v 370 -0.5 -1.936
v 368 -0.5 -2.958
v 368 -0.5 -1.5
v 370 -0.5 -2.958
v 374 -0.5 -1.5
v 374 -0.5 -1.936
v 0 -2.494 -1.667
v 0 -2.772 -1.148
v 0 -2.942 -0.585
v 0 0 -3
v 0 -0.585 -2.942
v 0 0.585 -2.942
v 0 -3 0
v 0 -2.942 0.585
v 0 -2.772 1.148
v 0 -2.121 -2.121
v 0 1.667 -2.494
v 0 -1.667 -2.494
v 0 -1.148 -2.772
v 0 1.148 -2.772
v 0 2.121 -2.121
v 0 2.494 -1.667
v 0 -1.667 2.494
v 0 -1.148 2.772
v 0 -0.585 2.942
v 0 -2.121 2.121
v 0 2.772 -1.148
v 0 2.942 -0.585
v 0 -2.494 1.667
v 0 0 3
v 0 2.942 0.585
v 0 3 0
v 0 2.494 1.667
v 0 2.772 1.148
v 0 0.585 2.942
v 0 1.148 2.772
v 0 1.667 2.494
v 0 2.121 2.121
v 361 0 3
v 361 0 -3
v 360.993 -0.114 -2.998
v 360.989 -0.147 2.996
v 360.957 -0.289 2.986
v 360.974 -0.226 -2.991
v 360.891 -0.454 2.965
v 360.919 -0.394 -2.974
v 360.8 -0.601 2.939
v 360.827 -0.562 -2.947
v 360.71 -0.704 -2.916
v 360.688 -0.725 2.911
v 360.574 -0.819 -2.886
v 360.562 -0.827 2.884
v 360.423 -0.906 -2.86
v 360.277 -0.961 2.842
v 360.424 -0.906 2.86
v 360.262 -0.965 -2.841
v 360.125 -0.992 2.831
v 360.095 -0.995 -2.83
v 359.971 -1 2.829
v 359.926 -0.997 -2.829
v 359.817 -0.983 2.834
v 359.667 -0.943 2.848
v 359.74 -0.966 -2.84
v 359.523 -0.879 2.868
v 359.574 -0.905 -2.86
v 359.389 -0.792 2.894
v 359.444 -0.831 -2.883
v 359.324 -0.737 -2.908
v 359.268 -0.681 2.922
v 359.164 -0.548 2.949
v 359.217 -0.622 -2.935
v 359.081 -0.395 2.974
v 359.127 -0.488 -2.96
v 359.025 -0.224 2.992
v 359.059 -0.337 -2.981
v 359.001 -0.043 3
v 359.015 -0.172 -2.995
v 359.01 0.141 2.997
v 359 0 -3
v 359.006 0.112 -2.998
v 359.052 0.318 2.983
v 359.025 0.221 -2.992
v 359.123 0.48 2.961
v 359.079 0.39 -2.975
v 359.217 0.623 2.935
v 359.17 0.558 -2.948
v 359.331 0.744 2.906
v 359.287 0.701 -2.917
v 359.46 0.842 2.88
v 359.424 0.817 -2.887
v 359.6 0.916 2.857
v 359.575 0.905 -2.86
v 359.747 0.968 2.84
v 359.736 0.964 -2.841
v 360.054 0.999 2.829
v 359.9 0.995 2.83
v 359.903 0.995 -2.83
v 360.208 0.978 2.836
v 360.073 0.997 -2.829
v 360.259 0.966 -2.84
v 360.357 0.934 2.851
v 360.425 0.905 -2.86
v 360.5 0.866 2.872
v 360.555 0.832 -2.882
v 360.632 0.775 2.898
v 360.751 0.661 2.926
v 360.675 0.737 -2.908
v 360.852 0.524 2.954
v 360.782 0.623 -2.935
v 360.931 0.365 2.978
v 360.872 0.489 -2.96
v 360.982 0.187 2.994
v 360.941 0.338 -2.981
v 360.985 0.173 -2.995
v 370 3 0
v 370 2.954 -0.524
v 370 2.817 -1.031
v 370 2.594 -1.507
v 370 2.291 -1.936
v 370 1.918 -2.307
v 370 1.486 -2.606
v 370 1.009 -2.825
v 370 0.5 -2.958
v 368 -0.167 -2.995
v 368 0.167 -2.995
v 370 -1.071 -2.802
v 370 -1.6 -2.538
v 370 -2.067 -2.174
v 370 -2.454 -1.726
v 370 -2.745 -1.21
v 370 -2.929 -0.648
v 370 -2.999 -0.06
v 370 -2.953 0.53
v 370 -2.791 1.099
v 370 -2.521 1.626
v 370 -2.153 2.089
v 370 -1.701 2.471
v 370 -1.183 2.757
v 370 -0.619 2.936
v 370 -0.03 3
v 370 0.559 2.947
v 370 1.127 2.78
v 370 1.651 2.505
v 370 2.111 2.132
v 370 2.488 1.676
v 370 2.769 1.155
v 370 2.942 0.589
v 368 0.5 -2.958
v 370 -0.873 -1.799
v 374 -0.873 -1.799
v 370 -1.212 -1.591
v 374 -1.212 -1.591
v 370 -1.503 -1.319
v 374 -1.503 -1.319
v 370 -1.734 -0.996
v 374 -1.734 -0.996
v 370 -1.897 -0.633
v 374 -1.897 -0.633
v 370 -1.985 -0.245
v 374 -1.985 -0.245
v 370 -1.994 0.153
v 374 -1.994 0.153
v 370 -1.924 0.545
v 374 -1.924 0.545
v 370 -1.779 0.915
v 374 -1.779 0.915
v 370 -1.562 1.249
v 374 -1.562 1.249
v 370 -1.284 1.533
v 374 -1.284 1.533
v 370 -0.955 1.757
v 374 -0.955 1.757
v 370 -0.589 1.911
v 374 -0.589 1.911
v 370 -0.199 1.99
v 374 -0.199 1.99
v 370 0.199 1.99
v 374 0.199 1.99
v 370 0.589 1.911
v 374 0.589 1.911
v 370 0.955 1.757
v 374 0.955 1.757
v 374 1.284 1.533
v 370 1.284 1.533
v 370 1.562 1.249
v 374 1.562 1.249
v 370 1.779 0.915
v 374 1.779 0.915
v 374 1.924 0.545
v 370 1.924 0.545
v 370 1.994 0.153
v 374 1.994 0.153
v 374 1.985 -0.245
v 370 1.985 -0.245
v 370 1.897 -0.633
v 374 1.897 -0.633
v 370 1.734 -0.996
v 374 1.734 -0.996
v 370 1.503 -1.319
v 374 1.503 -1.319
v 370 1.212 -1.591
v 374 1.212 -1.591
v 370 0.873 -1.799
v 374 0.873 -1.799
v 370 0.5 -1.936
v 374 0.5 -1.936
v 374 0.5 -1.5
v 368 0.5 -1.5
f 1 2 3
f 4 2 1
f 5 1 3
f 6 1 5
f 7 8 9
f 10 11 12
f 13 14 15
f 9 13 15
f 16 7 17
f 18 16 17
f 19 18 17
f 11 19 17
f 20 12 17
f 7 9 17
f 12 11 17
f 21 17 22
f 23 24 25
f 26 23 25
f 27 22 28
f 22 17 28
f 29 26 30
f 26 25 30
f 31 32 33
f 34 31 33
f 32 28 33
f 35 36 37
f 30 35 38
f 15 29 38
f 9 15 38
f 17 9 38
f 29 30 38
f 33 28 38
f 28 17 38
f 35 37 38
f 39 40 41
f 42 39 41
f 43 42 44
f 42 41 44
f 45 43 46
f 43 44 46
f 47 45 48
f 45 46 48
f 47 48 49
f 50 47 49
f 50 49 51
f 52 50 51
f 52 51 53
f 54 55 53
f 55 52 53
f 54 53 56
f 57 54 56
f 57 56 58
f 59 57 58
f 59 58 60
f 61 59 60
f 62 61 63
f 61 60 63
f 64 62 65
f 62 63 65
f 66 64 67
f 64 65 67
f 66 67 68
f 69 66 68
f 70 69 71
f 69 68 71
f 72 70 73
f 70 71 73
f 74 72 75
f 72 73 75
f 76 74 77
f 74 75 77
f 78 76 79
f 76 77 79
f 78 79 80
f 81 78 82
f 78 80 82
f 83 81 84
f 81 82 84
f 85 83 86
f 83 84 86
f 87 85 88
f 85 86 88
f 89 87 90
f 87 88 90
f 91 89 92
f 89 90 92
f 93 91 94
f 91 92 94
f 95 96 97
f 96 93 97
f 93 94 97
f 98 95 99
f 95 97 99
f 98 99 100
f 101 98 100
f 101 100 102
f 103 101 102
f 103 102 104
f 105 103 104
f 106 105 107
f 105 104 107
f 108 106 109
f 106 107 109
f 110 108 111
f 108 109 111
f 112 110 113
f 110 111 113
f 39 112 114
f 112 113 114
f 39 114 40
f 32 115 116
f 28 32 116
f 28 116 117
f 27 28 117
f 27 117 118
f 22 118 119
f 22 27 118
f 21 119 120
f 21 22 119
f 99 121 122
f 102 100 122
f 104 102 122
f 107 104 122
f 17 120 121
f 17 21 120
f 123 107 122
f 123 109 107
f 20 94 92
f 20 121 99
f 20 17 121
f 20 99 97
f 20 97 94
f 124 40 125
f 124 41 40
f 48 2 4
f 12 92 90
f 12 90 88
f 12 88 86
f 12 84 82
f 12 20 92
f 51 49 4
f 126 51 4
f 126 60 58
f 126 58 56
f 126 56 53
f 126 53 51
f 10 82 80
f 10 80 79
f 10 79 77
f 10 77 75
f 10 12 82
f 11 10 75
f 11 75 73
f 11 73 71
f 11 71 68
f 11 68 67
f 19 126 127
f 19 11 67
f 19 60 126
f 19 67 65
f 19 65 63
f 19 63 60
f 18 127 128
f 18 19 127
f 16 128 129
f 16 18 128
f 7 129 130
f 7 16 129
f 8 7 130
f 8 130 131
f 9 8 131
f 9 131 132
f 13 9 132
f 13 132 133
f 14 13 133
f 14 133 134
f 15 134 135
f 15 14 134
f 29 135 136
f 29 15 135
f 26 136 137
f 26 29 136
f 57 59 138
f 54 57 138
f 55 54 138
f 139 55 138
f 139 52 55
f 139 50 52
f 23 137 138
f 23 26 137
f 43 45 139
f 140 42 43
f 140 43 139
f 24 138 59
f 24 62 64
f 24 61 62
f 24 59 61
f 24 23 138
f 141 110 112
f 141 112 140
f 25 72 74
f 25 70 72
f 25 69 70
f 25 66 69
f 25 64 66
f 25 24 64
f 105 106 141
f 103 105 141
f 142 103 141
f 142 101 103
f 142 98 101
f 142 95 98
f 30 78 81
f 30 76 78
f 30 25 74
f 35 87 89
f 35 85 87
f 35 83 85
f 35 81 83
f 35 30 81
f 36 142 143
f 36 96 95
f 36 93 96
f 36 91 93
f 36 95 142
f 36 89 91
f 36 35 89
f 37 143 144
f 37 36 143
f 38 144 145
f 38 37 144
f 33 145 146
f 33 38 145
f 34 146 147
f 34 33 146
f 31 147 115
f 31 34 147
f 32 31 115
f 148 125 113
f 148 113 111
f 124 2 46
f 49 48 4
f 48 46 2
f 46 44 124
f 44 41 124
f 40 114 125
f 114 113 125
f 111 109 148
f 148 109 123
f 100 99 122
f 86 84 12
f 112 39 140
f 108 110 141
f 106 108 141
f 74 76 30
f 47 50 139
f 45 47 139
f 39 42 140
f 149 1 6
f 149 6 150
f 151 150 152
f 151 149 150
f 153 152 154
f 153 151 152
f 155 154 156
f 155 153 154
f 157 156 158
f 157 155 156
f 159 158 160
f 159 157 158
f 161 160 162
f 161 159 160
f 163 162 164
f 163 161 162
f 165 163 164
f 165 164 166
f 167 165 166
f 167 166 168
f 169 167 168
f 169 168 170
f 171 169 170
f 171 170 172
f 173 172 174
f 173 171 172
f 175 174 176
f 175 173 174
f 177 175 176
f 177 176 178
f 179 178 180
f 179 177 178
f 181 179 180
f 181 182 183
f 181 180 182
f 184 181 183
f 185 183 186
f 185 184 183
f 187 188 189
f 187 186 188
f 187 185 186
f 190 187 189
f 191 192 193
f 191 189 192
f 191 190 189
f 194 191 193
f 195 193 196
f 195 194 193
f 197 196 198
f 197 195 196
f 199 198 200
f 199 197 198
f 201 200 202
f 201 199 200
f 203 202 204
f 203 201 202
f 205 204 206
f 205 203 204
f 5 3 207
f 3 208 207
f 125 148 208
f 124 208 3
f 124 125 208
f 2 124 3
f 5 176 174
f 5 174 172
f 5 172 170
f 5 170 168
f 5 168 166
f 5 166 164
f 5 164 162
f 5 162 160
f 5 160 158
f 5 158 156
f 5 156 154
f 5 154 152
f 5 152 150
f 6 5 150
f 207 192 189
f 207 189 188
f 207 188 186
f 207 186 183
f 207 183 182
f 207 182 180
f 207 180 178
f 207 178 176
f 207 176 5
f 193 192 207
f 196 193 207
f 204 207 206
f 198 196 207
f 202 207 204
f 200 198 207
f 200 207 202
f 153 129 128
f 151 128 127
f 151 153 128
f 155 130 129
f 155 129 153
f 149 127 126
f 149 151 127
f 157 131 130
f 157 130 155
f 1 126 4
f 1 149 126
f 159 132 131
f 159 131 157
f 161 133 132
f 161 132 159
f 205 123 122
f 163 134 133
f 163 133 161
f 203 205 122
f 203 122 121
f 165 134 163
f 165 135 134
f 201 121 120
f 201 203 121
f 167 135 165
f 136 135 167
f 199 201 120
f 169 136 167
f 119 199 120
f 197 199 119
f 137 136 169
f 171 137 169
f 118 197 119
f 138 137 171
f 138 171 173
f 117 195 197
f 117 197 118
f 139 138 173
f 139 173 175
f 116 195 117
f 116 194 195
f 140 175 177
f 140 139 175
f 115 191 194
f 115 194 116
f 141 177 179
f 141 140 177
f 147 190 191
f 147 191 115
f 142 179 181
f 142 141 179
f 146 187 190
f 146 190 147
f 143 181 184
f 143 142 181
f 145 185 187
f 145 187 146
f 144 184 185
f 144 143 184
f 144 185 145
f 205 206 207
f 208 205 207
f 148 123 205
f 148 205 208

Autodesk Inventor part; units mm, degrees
ref_plane "YZ Plane" through (0, 0, 0) normal (1, 0, 0) x (0, 1, 0)
ref_plane "XZ Plane" through (0, 0, 0) normal (0, 1, 0) x (-1, 0, 0)
sketch "Sketch1" plane through (0, 0, 0) normal (1, 0, 0) x (0, 1, 0)
  circle A0 centre (0, 0) radius 3
  dimension "d4" = 6
extrude "Extrusion1" add sketch "Sketch1" along normal blind 370
sketch "Sketch2" plane through (370, 0, 0) normal (1, 0, 0) x (0, 0, -1)
  circle A0 centre (0, 0) radius 2
  dimension "d5" = 4
extrude "Extrusion2" add sketch "Sketch2" along normal blind 4
thread "Thread1" size "M4x0.7" class "6g" standard "ANSI Metric M Profile" full length
ref_plane "Work Plane1" through (0, 0, -3) normal (0, 0, 1) x (1, 0, 0)
sketch "Sketch3" plane through (0, 0, -3) normal (0, 0, 1) x (1, 0, 0)
  line L0 (374, 0.5) -> (368, 0.5)
  line L1 (368, 0.5) -> (368, -0.5)
  line L2 (368, -0.5) -> (374, -0.5)
  line L3 (374, -0.5) -> (374, 0.5)
  line L4 (374, 0.5) -> (368, -0.5) construction
  line L5 (368, 0.5) -> (374, -0.5) construction
  line L6 (374, -2) -> (374, 2) projected
  point P0 (0, 0)
  point P1 (371, 0)
  dimension "d10" = 1
  dimension "d11" = 6
  dimension "d18" = 0
extrude "Extrusion3" cut sketch "Sketch3" along normal blind 1.5
sketch "Sketch4" plane through (0, 0, -3) normal (0, 0, 1) x (1, 0, 0)
  circle A0 centre (360, 0) radius 1
  line L0 (370, -3) -> (370, 3) projected
  point P0 (0, 0)
  point P1 (370, 0.5)
  point P2 (370, -0.5)
  dimension "d14" = 2
  dimension "d15" = 10
extrude "Extrusion4" cut sketch "Sketch4" along normal up to next
properties part number "Rod"
